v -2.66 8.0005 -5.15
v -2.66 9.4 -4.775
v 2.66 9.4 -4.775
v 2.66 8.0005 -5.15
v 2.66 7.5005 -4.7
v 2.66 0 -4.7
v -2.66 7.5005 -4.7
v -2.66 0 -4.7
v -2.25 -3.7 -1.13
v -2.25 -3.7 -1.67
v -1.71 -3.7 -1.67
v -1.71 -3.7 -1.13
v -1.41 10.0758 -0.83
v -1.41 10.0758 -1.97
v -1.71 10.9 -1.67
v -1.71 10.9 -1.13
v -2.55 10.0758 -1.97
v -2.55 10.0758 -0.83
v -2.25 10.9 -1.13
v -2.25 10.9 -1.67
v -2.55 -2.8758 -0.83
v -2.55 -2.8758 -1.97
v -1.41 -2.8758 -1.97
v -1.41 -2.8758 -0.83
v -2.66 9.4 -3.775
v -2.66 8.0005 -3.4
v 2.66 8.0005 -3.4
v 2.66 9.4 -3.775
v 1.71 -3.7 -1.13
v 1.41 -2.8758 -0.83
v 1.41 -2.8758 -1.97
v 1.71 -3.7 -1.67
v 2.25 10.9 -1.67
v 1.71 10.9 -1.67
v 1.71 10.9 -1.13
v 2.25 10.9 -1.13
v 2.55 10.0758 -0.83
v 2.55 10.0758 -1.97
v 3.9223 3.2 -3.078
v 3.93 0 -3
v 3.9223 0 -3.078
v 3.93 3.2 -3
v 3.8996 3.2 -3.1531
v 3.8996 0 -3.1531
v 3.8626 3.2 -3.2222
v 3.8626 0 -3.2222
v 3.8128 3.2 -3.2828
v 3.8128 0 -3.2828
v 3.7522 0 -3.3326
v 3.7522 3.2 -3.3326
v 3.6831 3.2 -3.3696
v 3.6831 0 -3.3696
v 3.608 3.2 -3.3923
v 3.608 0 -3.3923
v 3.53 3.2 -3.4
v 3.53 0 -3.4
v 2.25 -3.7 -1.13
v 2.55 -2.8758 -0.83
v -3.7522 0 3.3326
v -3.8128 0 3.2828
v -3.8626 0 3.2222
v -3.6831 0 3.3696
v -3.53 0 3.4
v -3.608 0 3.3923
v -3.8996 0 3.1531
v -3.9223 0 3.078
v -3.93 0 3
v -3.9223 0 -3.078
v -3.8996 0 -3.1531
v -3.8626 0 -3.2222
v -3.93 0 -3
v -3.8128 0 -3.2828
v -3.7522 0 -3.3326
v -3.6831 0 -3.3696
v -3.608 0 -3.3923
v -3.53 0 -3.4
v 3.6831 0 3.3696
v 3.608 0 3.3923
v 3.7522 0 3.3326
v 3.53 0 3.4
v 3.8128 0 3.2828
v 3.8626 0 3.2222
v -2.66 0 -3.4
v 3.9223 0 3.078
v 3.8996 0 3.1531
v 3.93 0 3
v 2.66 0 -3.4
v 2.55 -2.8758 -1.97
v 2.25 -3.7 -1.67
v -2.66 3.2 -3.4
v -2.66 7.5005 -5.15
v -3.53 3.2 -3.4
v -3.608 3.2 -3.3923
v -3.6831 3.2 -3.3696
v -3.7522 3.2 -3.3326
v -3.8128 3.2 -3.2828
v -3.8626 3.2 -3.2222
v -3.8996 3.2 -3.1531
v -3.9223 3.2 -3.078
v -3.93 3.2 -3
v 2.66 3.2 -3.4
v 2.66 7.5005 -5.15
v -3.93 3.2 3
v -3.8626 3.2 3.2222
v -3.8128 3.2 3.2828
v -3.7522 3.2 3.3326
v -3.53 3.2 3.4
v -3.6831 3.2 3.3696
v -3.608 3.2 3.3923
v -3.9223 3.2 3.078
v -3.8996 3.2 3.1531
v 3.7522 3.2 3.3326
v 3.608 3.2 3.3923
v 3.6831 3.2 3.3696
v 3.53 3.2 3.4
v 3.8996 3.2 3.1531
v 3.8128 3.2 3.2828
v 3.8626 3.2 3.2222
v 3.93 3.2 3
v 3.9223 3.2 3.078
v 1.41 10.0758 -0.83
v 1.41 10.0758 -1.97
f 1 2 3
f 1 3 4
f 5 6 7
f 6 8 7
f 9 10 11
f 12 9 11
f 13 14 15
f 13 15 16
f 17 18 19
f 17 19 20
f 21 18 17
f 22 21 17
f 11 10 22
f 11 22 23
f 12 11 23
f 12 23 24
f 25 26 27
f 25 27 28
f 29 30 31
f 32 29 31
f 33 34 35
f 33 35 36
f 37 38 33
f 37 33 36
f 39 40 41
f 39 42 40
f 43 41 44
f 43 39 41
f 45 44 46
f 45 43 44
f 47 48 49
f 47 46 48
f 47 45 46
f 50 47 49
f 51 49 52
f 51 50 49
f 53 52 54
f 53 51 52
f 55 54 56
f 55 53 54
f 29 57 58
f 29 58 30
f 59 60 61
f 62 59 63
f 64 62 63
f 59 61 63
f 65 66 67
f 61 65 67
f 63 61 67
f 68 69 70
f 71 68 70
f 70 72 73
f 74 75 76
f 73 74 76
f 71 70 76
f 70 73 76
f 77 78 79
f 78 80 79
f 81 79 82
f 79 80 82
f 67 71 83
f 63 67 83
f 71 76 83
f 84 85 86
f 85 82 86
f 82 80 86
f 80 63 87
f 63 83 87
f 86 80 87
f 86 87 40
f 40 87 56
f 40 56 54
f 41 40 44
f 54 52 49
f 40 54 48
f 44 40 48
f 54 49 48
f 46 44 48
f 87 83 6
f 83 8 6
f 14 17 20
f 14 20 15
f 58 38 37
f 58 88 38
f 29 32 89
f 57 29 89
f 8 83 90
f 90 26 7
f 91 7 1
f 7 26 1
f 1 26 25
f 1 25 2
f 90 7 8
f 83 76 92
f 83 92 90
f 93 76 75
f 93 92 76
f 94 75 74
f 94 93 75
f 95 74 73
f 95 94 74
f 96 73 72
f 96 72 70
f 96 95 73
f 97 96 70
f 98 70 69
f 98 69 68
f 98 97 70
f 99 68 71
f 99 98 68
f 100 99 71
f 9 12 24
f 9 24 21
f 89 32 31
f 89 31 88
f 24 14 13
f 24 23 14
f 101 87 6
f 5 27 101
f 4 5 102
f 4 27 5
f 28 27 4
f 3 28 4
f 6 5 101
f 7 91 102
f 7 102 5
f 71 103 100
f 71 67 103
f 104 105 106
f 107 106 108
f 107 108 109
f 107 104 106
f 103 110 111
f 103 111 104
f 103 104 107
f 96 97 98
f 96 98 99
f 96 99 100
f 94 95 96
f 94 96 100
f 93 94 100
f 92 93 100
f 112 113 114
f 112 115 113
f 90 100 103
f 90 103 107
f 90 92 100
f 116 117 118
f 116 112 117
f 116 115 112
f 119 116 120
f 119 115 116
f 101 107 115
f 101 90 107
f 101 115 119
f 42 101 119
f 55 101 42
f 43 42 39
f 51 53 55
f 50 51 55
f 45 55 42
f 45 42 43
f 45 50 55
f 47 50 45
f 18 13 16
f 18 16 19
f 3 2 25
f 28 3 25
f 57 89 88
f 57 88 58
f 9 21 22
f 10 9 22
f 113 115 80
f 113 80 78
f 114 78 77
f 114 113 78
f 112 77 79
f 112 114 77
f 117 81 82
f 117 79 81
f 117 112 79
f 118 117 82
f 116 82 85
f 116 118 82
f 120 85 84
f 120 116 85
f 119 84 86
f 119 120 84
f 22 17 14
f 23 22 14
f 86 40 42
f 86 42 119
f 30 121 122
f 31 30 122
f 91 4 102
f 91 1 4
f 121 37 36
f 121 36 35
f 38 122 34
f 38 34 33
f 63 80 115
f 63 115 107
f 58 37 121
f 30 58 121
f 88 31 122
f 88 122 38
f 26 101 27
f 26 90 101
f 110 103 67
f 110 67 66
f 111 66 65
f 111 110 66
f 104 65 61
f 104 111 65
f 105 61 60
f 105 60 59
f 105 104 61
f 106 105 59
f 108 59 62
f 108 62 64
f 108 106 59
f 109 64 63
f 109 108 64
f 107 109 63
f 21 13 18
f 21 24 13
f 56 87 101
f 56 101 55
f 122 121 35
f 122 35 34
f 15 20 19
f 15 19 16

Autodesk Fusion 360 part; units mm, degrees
sketch "Skizze1" plane through (0, 0, 0) normal (0, 1, 0) x (1, 0, 0)
  line L0 (-3.93, 3.4) -> (3.93, 3.4)
  line L1 (3.93, 3.4) -> (3.93, -3.4)
  line L2 (3.93, -3.4) -> (-3.93, -3.4)
  line L3 (-3.93, -3.4) -> (-3.93, 3.4)
  line L4 (0, 3.4) -> (0, -3.4) construction
  dimension "d9" = 7.86
  dimension "d10" = 6.8
extrude "Extrusion1" add sketch "Skizze1" along normal blind 3.2 makes body 1
sketch "Skizze3" plane through (0, 0, 0) normal (1, 0, 0) x (0, 0, -1)
  line L0 (3.4, 0) -> (3.4, 3.2)
  line L1 (3.4, 0) -> (4.7, 0)
  line L2 (4.7, 0) -> (4.7, 9.4)
  line L3 (4.7, 9.4) -> (3.4, 9.4) construction
  line L4 (3.4, 9.4) -> (3.4, 0)
  line L5 (4.7, 9.4) -> (5.15, 9.4)
  line L6 (5.15, 9.4) -> (5.15, 0)
  line L7 (5.15, 0) -> (4.7, 0)
  line L8 (4.7, 0) -> (4.7, 9.4) construction
  line L9 (3.4, 8.0005) -> (3.775, 9.4)
  line L10 (4.775, 9.4) -> (5.15, 8.0005)
  line L11 (5.15, 7.5005) -> (4.7, 7.5005)
  line L12 (4.775, 9.4) -> (3.775, 9.4)
  line L13 (3.775, 9.4) -> (4.775, 9.4) construction
  line L14 (4.775, 9.4) -> (5.15, 9.4) construction
  line L15 (3.775, 9.4) -> (3.4, 9.4) construction
  line L16 (5.15, 9.4) -> (4.775, 9.4) construction
  line L17 (5.15, 8.0005) -> (5.15, 7.5005) construction
  line L18 (5.15, 7.5005) -> (5.15, 8.0005) construction
  line L19 (5.15, 9.4) -> (3.4, 9.4)
  line L20 (5.15, 0) -> (3.4, 0)
  dimension "d31" = 9.4
  dimension "d33" = 1.3
  dimension "d35" = 90
  dimension "d36" = 75
  dimension "d37" = 75
  dimension "d39" = 1
  dimension "d42" = 0.5
  dimension "d48" = 1.75
sketch "Skizze2" plane through (0, 0, 0) normal (0, 1, 0) x (1, 0, 0)
  line L0 (-1.41, 0.83) -> (-2.55, 0.83)
  line L1 (-2.55, 0.83) -> (-2.55, 1.97)
  line L2 (-2.55, 1.97) -> (-1.41, 1.97)
  line L3 (-1.41, 1.97) -> (-1.41, 0.83)
  line L4 (-3.93, 3.4) -> (3.93, 3.4)
  line L5 (3.93, 3.4) -> (3.93, -3.4)
  line L6 (3.93, -3.4) -> (-3.93, -3.4)
  line L7 (-3.93, -3.4) -> (-3.93, 3.4)
  line L8 (0, 3.4) -> (0, 1.4) construction
  line L9 (-1.41, 1.4) -> (-2.55, 1.4) construction
  line L10 (0, 1.4) -> (-1.98, 1.4)
  point P0 (-1.98, 1.4)
  dimension "d16" = 1.14
  dimension "d17" = 1.14
  dimension "d24" = 2
  dimension "d26" = 1.98
extrude "Extrusion3" add sketch "Skizze3" along normal mid plane 5.32 contours L0 L1 L2 L4 L9 L12 L19 L20 | L2 L5 L6 L10 L11 L12 L19 bodies 1
extrude "Extrusion2" add sketch "Skizze2" along normal blind 10.9 and the other way blind 3.7 separate body contours L0 L1 L2 L3 makes body 2
chamfer "Fase2" distance 0.3 angle 70 8 edges at (-1.98, 10.9, -0.83) (-1.41, 10.9, -1.4) (-1.98, 10.9, -1.97) (-2.55, 10.9, -1.4) (-1.41, -3.7, -1.4) (-1.98, -3.7, -0.83) (-2.55, -3.7, -1.4) (-1.98, -3.7, -1.97) measured on face at (-1.79, 10.9, -1.21) measured on face at (-1.79, 10.9, -1.21) measured on face at (-1.79, 10.9, -1.21) measured on face at (-1.79, 10.9, -1.21) measured on face at (-1.79, -3.7, -1.21) measured on face at (-1.79, -3.7, -1.21) measured on face at (-1.79, -3.7, -1.21) measured on face at (-1.79, -3.7, -1.21) on bodies 2
pattern_linear "R-Anordnung1" count 2 spacing 3.96 along (1, 0, 0) of bodies 2 makes body 3
fillet "Abrundung1" radius 0.4 4 edges at (3.93, 1.6, -3.4) (3.93, 1.6, 3.4) (-3.93, 1.6, 3.4) (-3.93, 1.6, -3.4) on bodies 1
equation "n = 2" comment "Number of pins"
equation "P = 3.96 mm" comment "Pin pitch"
equation "B1 = A1 + ( 1.95 mm * 2 )" comment "Width of bottom plate"
equation "A1 = ( n - 1 ) * P" comment "Total width of all pins"
equation "C1 = 6.8 mm" comment "Height of bottom plate"
equation "H1 = 9.4 mm" comment "Height of latching plate"
equation "O1 = 2 mm" comment "Vertical offset pin-center to bottom plate border"
equation "d9 = B1"
equation "d10 = C1"
equation "D1 = 3.2 mm" comment "Total depth of bottom plate"
equation "Pw = 1.14 mm" comment "Width & height of square pin"
equation "d13 = D1"
equation "d16 = Pw"
equation "d17 = Pw"
equation "LPinTop = 7.7 mm + D1" comment "Length of the pin measured from the bottom plane to the top of the pin (away from PCB)"
equation "LPinBottom = 14.6 mm - LPinTop" comment "Length of the pin in bottom direction, measured from the bottom plane"
equation "d20 = LPinTop"
equation "d22 = LPinBottom"
equation "d24 = O1"
equation "Pin1XOffset = ( ( n - 1 ) * P ) / 2" comment "First pin X offset measured from the X axis"
equation "d26 = Pin1XOffset"
equation "d27 = n"
equation "d29 = P"
equation "d31 = H1"
equation "D2 = 1.3 mm" comment "(Measured) depth of latching plate (narrowest section)"
equation "d33 = D2"
equation "d35 = alpha"
equation "d36 = 90 deg - beta"
equation "d37 = 90 deg - beta"
equation "Wx1 = 1.0 mm" comment "(Measured) Width of the topmost part of the latching plate"
equation "Hx1 = 0.5 mm" comment "(Measured) Height of the latching surface facing away from the pins"
equation "alpha = 90 deg" comment "Angle of the latching surface. Shown by the datasheet as ~45°but real parts have 90°"
equation "d42 = Hx1"
equation "beta = 15 deg" comment "(Estimated) Latching plate tapering angle"
equation "WL1 = 1.27 mm" comment "(Measured) With of the section of the bottom plate where there is no latching plate per side)"
equation "d45 = B1 - ( WL1 * 2 )"
equation "Dlatch = 1.75 mm" comment "(Measured) Total depth of latching plate"
equation "d48 = Dlatch"
equation "d54 = delta"
equation "delta = 70 deg" comment "(Estimated) Taper angle of the pin top & bottoms"
